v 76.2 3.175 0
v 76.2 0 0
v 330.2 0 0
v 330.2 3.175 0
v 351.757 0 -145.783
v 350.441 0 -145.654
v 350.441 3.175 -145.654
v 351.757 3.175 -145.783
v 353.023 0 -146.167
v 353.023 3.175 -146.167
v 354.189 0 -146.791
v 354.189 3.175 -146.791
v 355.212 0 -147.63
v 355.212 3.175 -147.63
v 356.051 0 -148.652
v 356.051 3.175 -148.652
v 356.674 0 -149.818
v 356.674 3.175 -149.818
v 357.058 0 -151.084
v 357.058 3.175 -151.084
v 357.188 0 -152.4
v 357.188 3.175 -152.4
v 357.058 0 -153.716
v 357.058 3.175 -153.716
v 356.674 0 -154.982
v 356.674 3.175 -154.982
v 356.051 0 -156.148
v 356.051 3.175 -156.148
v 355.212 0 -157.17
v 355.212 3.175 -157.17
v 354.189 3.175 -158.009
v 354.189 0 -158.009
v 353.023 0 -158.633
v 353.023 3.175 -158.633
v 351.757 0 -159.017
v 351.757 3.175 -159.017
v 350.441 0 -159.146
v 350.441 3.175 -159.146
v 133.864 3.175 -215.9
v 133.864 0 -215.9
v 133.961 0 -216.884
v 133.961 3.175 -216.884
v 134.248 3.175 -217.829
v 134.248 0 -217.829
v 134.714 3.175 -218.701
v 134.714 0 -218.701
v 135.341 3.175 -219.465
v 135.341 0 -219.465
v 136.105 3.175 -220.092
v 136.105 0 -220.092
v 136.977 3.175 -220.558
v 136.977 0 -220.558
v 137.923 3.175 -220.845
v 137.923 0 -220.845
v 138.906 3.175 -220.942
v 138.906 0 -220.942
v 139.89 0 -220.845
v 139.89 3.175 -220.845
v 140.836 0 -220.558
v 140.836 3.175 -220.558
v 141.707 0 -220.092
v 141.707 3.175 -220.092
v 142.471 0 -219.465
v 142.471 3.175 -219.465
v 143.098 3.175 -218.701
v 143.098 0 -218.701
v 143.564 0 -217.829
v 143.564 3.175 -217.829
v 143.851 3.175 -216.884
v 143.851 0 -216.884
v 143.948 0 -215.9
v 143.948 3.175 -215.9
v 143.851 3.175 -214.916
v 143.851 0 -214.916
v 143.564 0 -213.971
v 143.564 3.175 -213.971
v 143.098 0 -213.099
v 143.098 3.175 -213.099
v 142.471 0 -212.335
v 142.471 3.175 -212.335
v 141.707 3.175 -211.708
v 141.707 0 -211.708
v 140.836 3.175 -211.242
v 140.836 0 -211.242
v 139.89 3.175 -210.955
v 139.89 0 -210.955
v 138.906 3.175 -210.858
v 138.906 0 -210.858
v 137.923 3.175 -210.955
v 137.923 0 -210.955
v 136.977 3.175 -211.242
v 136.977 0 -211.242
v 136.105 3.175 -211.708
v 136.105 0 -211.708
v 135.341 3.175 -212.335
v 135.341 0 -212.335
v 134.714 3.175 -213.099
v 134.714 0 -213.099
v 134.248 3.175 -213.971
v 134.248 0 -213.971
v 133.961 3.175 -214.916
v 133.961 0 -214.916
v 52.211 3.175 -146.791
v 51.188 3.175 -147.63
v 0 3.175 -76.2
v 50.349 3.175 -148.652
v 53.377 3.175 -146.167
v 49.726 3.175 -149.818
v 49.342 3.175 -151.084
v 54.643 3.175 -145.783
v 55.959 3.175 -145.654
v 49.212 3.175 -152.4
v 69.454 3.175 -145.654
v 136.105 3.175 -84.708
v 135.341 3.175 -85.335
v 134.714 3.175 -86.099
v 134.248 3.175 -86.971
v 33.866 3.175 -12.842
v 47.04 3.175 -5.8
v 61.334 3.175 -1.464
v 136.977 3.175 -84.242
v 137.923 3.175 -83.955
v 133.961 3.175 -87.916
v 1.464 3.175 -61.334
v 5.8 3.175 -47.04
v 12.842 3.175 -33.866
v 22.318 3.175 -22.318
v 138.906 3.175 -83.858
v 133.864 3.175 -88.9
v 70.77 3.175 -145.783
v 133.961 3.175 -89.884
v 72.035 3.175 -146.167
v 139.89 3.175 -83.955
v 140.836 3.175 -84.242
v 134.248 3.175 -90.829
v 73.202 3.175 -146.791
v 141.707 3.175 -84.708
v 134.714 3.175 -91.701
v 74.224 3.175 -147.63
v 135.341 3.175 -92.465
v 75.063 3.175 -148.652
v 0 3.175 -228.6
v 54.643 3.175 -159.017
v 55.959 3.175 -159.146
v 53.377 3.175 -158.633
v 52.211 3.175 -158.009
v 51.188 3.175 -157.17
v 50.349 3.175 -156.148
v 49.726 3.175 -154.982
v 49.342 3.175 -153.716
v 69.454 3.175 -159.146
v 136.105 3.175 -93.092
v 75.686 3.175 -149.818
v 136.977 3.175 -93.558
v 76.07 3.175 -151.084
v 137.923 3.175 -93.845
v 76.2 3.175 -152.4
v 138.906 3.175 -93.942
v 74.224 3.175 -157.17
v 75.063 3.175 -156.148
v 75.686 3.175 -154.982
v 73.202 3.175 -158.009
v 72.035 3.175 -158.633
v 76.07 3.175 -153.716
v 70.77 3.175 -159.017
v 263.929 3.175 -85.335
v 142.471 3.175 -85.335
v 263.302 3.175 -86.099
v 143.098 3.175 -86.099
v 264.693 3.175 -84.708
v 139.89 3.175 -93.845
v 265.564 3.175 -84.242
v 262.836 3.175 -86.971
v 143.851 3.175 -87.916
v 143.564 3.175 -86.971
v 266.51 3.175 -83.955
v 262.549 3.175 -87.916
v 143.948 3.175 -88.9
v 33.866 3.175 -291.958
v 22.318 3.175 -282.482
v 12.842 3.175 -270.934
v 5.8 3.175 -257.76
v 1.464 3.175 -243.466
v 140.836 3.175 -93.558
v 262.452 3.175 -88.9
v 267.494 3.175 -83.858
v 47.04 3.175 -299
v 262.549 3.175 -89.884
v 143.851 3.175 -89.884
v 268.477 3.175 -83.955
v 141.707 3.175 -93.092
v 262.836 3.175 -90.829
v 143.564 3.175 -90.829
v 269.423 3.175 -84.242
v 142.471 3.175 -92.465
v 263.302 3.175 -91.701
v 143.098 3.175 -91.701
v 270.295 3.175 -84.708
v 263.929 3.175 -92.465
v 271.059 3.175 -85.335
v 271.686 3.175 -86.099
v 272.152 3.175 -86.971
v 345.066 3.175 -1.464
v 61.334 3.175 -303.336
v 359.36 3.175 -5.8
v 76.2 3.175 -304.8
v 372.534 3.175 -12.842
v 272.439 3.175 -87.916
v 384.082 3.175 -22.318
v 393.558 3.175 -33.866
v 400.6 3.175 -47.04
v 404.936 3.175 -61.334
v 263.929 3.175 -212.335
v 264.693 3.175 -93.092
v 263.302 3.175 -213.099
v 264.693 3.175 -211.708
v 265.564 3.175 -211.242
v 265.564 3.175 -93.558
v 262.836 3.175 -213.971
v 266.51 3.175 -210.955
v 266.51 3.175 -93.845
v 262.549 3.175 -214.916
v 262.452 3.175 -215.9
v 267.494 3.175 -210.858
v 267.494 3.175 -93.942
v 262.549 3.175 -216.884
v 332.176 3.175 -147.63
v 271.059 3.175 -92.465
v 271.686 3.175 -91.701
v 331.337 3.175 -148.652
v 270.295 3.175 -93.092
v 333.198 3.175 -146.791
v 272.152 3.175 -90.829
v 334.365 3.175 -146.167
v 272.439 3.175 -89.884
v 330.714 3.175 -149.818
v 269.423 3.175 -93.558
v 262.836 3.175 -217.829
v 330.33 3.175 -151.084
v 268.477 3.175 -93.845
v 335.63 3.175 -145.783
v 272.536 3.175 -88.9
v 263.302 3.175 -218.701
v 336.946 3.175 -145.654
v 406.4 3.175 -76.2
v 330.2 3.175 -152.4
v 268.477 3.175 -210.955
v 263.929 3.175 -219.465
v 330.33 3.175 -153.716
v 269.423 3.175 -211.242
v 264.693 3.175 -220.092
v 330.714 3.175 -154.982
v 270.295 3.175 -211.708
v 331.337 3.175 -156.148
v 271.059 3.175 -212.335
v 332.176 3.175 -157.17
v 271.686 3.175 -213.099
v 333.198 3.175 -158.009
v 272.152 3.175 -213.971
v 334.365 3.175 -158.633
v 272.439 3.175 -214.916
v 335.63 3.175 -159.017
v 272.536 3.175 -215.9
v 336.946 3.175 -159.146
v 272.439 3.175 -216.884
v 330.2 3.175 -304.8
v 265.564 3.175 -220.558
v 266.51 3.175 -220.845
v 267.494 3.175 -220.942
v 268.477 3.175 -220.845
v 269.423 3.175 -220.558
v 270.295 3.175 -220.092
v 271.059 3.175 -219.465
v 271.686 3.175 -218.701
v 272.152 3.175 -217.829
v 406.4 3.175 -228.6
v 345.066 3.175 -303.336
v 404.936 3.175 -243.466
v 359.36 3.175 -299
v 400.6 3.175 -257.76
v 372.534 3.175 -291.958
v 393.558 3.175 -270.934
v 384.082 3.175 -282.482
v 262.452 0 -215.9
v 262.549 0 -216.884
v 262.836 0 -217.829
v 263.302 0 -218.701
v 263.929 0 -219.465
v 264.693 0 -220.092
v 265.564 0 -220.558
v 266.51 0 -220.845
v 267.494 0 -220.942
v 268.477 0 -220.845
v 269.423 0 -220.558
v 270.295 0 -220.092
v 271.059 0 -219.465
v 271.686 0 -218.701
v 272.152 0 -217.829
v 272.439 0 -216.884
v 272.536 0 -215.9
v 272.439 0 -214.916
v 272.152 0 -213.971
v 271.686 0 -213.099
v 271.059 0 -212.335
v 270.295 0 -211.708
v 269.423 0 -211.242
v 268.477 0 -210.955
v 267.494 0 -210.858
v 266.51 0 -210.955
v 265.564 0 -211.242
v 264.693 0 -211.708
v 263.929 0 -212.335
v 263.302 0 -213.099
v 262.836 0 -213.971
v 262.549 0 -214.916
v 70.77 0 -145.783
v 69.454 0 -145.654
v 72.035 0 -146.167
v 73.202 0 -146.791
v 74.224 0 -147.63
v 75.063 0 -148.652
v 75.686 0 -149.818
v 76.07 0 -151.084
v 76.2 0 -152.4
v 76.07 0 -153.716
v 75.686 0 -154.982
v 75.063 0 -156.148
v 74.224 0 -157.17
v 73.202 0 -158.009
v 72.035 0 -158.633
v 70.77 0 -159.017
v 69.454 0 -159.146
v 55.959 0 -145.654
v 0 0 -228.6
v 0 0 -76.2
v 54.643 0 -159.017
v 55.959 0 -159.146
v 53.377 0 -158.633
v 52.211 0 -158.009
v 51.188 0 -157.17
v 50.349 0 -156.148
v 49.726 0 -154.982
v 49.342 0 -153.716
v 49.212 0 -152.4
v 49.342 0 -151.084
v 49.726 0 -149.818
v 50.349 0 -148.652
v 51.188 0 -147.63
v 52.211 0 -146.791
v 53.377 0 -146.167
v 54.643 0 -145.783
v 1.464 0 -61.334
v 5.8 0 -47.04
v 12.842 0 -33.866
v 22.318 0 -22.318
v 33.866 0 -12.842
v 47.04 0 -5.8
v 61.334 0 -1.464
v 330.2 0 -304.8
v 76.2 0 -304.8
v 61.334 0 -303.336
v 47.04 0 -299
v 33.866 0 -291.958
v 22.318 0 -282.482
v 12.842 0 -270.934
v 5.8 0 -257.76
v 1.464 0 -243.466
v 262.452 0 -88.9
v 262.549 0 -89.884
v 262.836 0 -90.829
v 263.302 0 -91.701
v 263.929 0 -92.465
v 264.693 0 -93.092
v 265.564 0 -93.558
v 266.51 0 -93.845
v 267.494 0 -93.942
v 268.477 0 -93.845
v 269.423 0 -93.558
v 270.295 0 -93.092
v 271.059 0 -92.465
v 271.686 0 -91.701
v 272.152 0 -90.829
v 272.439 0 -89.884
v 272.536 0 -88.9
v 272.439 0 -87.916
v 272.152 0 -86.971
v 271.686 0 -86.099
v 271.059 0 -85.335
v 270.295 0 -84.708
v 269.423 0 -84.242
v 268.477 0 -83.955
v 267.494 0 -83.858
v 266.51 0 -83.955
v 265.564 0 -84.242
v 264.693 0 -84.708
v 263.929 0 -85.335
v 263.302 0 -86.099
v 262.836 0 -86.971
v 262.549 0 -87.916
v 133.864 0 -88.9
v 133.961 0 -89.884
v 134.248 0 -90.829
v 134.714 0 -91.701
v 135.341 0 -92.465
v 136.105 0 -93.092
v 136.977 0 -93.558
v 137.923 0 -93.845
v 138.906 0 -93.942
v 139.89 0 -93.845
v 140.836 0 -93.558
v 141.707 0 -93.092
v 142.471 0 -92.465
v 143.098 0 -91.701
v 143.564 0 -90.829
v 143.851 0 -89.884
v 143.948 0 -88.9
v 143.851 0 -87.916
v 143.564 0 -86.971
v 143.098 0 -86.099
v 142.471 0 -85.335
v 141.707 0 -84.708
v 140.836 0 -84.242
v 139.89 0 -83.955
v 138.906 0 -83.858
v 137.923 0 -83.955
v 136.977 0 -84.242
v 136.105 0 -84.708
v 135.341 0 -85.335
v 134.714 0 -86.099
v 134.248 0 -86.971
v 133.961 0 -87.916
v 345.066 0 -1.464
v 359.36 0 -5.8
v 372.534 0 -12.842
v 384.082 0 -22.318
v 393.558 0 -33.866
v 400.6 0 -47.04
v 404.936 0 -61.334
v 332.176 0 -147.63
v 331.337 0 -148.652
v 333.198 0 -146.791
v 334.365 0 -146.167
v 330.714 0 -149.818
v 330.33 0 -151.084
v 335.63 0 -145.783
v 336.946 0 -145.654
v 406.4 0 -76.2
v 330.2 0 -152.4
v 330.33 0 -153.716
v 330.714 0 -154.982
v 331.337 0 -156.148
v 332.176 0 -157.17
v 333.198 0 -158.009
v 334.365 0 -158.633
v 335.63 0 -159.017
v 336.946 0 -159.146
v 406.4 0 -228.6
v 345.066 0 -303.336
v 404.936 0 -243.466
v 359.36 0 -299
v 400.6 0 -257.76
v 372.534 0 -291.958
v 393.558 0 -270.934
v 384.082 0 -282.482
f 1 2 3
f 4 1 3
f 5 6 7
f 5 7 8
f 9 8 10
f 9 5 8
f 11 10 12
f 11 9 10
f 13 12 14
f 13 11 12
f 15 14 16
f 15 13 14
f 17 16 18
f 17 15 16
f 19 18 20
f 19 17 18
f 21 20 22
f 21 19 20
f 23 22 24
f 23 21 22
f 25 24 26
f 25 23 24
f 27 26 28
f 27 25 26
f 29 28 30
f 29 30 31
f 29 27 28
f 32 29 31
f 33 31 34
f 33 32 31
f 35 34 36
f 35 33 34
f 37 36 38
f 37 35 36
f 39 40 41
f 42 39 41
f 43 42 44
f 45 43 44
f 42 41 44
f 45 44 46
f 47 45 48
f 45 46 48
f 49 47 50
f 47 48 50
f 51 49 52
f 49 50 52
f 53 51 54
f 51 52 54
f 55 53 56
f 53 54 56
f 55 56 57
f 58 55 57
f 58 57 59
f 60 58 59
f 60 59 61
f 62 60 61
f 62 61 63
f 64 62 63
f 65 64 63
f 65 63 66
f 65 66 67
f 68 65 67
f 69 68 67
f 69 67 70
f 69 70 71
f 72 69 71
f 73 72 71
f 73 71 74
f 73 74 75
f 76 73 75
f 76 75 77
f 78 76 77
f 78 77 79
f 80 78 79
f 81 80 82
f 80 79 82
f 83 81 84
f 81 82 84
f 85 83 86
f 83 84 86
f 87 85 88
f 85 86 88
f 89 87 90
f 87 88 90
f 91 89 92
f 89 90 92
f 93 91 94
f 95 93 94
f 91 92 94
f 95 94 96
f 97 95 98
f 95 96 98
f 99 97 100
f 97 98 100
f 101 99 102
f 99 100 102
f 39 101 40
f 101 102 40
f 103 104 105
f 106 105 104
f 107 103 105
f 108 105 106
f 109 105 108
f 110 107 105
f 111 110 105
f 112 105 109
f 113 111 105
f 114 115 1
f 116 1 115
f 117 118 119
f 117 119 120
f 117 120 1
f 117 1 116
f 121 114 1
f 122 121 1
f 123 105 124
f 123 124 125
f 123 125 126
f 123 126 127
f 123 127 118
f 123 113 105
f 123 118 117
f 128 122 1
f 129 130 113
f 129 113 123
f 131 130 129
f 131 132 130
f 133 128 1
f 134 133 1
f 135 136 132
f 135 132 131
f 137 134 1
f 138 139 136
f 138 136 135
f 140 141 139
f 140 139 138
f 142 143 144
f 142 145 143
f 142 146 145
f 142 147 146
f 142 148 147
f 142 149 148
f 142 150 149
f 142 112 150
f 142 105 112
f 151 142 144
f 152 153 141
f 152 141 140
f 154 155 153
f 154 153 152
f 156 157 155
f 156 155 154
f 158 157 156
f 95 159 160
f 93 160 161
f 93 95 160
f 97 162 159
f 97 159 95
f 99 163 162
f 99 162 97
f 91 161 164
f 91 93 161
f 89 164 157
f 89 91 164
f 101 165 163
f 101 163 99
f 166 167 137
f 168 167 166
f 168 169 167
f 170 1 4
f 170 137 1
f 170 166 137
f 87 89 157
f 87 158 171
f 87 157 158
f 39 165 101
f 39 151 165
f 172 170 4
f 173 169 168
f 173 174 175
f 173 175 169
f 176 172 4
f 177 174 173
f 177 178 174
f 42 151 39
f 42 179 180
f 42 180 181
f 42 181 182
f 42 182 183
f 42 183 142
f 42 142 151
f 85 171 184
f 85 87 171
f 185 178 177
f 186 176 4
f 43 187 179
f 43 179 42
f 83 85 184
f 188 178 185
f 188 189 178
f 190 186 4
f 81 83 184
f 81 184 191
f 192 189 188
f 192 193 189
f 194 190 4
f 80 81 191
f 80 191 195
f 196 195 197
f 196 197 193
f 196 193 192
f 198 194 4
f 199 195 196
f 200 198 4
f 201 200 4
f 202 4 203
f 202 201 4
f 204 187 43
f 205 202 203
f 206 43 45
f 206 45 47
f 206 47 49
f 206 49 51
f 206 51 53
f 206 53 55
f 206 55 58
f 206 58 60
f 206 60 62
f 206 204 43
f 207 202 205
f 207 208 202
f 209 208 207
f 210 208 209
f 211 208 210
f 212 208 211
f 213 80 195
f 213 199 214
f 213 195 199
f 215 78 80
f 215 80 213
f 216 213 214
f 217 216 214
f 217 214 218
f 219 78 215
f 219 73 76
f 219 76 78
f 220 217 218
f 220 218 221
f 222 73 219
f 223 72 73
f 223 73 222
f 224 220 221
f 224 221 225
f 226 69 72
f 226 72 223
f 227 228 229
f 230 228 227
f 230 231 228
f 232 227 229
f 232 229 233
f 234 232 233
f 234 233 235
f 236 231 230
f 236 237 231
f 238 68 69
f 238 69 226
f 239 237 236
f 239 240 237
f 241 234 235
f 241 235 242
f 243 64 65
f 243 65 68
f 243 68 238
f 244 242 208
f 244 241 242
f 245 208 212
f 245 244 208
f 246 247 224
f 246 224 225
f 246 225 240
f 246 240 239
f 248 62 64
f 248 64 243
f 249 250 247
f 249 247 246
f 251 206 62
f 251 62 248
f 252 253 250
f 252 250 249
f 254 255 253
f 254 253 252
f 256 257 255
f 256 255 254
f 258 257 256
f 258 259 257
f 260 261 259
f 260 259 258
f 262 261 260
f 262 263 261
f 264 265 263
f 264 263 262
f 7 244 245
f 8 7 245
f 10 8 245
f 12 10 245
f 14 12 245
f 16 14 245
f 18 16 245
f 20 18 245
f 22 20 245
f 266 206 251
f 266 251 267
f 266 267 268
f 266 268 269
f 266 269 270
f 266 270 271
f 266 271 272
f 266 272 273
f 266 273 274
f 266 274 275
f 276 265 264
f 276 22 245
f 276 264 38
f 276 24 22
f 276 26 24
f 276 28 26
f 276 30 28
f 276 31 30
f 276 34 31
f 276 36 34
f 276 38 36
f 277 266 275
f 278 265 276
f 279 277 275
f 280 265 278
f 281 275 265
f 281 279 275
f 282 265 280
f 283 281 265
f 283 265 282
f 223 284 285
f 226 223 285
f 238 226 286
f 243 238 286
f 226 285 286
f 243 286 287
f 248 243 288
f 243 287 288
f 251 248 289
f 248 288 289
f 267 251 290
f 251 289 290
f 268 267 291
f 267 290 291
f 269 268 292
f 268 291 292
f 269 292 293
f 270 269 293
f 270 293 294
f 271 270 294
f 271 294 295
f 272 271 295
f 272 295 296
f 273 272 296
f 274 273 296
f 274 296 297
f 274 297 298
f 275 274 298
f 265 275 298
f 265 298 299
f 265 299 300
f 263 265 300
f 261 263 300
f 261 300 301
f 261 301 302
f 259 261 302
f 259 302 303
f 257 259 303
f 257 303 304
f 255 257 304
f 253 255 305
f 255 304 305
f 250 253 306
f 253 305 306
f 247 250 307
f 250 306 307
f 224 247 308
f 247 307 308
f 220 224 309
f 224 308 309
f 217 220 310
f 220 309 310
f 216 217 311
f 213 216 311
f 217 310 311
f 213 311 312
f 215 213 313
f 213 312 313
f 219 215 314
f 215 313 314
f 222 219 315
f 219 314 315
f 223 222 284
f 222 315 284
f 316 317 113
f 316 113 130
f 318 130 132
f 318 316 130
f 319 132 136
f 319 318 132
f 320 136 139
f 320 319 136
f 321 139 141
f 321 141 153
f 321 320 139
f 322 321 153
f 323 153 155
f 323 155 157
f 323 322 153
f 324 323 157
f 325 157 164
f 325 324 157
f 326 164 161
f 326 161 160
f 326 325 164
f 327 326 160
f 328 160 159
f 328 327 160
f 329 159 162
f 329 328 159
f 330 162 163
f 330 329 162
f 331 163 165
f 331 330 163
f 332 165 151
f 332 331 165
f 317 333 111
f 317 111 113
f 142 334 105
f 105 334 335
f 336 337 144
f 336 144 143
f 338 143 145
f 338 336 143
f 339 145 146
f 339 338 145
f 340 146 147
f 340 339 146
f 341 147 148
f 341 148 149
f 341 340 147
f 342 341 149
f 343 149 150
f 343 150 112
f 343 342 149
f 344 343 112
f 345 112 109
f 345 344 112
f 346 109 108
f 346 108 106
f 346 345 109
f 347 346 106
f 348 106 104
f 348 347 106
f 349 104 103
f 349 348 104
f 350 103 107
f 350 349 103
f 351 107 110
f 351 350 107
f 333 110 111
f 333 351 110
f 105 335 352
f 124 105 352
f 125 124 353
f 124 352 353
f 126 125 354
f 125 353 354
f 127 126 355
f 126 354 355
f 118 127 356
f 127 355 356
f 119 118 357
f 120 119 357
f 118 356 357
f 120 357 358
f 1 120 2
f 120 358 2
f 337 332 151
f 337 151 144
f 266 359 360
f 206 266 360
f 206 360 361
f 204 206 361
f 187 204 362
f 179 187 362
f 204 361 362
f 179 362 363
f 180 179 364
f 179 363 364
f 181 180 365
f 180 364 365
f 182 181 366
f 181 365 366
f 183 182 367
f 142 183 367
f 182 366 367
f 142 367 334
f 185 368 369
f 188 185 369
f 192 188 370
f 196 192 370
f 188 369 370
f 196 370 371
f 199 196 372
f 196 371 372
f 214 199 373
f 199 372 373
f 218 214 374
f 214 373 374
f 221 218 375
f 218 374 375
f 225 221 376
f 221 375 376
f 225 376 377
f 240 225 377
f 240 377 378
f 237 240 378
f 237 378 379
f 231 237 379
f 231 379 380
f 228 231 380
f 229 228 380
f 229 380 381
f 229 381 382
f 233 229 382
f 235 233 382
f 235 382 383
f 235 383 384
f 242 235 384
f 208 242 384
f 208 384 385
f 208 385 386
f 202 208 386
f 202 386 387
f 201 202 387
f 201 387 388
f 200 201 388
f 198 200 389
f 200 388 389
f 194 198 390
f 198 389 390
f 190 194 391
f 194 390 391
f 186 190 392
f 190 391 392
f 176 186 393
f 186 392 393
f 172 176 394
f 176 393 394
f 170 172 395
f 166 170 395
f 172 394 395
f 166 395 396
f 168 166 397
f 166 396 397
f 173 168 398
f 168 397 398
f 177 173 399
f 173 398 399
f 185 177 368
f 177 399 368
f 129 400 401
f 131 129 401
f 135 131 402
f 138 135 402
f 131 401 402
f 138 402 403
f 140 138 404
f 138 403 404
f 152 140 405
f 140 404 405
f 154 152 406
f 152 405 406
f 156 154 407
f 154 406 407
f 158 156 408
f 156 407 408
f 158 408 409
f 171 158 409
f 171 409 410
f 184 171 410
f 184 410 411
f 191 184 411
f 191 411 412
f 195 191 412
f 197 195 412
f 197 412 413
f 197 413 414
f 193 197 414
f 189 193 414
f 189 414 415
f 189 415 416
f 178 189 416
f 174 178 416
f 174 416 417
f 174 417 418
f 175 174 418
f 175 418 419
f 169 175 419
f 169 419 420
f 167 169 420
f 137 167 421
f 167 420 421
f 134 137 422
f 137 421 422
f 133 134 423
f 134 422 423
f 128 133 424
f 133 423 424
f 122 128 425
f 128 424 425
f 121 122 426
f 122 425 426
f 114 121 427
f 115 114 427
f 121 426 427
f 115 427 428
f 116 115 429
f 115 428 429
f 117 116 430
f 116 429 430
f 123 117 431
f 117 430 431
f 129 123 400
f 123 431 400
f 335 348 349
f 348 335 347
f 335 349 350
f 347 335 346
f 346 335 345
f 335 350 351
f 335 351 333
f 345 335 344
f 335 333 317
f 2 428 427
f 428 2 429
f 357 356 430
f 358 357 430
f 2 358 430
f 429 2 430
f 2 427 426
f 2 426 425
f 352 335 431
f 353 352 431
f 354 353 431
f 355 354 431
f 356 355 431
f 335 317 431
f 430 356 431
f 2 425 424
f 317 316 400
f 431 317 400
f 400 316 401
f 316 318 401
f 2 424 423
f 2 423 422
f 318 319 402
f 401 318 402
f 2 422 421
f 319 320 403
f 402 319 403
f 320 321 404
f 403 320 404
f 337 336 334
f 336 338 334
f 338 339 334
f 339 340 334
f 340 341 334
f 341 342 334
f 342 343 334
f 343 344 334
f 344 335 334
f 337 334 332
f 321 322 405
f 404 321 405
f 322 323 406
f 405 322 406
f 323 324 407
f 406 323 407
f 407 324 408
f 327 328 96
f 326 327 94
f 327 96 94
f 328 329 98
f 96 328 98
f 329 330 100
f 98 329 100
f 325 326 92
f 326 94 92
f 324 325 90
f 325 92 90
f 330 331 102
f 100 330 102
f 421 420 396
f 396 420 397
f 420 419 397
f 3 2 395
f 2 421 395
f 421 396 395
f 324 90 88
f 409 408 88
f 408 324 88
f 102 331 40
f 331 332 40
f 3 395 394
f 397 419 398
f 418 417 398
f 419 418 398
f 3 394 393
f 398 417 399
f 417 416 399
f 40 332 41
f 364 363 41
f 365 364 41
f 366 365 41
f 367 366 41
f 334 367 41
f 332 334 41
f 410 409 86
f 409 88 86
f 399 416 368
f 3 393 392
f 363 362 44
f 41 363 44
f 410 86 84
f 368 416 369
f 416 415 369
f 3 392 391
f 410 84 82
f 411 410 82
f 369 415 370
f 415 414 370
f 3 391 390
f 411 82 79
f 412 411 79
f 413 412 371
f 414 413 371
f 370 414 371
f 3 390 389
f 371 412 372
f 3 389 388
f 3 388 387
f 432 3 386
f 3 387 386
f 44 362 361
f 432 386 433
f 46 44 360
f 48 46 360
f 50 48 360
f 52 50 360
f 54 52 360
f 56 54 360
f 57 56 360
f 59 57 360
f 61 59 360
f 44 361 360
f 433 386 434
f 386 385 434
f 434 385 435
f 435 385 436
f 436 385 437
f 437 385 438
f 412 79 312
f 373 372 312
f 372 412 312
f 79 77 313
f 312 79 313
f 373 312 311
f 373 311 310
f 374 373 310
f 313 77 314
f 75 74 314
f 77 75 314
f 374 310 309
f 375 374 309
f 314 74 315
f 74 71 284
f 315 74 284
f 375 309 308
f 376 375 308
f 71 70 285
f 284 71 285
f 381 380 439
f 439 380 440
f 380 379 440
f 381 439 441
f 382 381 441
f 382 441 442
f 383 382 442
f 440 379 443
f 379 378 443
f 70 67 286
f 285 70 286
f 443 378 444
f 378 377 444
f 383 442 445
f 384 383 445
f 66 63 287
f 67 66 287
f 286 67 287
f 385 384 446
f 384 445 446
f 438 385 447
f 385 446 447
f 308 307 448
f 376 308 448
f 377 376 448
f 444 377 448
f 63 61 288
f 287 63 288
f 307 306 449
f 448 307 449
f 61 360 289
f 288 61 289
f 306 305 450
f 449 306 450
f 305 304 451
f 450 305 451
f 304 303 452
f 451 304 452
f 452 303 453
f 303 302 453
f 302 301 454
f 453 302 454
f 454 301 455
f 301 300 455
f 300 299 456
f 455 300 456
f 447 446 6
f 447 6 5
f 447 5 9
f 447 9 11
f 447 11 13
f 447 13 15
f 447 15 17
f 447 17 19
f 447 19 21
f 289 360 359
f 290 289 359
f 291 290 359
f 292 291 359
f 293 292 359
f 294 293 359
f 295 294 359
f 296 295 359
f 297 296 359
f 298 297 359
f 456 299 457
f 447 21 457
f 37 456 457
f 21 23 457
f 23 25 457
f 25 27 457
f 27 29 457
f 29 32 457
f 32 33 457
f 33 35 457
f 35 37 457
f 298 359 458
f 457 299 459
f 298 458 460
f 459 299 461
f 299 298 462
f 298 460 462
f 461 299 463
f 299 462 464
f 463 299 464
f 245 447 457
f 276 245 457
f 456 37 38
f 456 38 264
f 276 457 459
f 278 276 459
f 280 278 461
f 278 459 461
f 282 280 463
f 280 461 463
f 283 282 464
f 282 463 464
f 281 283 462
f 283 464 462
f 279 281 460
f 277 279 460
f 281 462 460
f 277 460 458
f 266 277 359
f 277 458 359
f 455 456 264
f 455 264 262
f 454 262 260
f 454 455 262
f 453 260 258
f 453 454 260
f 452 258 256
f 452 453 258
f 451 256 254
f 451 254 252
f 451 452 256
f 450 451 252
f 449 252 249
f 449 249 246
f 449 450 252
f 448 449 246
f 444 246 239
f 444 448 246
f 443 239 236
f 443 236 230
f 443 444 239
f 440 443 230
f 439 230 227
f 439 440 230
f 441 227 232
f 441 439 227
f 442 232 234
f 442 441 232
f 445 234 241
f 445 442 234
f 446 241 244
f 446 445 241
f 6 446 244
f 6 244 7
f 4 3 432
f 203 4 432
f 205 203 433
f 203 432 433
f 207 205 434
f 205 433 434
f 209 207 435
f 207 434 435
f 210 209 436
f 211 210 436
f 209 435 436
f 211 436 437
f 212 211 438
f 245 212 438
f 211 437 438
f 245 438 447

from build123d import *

# Parameters (mm, degrees)
BOSS_EXTRUDE1_DEPTH         = 3.175
F_1_2_CLEARANCE_SLOT1_DEPTH = 3.175
F_3_8_CLEARANCE_HOLE1_D     = 10.0838


# Read off the part's stored shape, not the designer's step: 1/2 Clearance Slot1
with BuildPart() as part:
    # Sketch1 → Boss-Extrude1 (new body)
    with BuildSketch(Plane(origin=(0, 0, 0), x_dir=(1, 0, 0), z_dir=(0, 1, 0))):
        with BuildLine():
            Line((76.2, 0), (330.2, 0))
            ThreePointArc((330.2, 0), (384.081536726, 22.318463274), (406.4, 76.2))
            Line((406.4, 76.2), (406.4, 228.6))
            ThreePointArc((406.4, 228.6), (384.081536726, 282.481536726), (330.2, 304.8))
            Line((330.2, 304.8), (76.2, 304.8))
            ThreePointArc((76.2, 304.8), (22.318463274, 282.481536726), (0, 228.6))
            Line((0, 228.6), (0, 76.2))
            ThreePointArc((0, 76.2), (22.318463274, 22.318463274), (76.2, 0))
        make_face()
    extrude(amount=BOSS_EXTRUDE1_DEPTH)

    # 1/2 Clearance Slot1 outline → 1/2 Clearance Slot1 (cut)
    with BuildSketch(Plane(origin=(0, 0, 0), x_dir=(1, 0, 0), z_dir=(0, 1, 0))):
        with BuildLine():
            Line((336.94624, 145.65376), (350.44126, 145.65376))
            ThreePointArc((350.44126, 145.65376), (357.1875, 152.4), (350.44126, 159.14624))
            Line((350.44126, 159.14624), (336.94624, 159.14624))
            ThreePointArc((336.94624, 159.14624), (330.2, 152.4), (336.94624, 145.65376))
        make_face()
        with BuildLine():
            ThreePointArc((69.45376, 145.65376), (76.2, 152.4), (69.45376, 159.14624))
            Line((69.45376, 159.14624), (55.95874, 159.14624))
            ThreePointArc((55.95874, 159.14624), (49.2125, 152.4), (55.95874, 145.65376))
            Line((55.95874, 145.65376), (69.45376, 145.65376))
        make_face()
    extrude(amount=F_1_2_CLEARANCE_SLOT1_DEPTH, mode=Mode.SUBTRACT)

    # 3/8 Clearance Hole1 (through all)
    with Locations(Plane(origin=(0, 3.175, 0), x_dir=(1, 0, 0), z_dir=(0, 1, 0))):
        with Locations((138.90625, 88.9), (267.49375, 215.9), (267.49375, 88.9), (138.90625, 215.9)):
            Hole(F_3_8_CLEARANCE_HOLE1_D / 2)


solid = part.part
